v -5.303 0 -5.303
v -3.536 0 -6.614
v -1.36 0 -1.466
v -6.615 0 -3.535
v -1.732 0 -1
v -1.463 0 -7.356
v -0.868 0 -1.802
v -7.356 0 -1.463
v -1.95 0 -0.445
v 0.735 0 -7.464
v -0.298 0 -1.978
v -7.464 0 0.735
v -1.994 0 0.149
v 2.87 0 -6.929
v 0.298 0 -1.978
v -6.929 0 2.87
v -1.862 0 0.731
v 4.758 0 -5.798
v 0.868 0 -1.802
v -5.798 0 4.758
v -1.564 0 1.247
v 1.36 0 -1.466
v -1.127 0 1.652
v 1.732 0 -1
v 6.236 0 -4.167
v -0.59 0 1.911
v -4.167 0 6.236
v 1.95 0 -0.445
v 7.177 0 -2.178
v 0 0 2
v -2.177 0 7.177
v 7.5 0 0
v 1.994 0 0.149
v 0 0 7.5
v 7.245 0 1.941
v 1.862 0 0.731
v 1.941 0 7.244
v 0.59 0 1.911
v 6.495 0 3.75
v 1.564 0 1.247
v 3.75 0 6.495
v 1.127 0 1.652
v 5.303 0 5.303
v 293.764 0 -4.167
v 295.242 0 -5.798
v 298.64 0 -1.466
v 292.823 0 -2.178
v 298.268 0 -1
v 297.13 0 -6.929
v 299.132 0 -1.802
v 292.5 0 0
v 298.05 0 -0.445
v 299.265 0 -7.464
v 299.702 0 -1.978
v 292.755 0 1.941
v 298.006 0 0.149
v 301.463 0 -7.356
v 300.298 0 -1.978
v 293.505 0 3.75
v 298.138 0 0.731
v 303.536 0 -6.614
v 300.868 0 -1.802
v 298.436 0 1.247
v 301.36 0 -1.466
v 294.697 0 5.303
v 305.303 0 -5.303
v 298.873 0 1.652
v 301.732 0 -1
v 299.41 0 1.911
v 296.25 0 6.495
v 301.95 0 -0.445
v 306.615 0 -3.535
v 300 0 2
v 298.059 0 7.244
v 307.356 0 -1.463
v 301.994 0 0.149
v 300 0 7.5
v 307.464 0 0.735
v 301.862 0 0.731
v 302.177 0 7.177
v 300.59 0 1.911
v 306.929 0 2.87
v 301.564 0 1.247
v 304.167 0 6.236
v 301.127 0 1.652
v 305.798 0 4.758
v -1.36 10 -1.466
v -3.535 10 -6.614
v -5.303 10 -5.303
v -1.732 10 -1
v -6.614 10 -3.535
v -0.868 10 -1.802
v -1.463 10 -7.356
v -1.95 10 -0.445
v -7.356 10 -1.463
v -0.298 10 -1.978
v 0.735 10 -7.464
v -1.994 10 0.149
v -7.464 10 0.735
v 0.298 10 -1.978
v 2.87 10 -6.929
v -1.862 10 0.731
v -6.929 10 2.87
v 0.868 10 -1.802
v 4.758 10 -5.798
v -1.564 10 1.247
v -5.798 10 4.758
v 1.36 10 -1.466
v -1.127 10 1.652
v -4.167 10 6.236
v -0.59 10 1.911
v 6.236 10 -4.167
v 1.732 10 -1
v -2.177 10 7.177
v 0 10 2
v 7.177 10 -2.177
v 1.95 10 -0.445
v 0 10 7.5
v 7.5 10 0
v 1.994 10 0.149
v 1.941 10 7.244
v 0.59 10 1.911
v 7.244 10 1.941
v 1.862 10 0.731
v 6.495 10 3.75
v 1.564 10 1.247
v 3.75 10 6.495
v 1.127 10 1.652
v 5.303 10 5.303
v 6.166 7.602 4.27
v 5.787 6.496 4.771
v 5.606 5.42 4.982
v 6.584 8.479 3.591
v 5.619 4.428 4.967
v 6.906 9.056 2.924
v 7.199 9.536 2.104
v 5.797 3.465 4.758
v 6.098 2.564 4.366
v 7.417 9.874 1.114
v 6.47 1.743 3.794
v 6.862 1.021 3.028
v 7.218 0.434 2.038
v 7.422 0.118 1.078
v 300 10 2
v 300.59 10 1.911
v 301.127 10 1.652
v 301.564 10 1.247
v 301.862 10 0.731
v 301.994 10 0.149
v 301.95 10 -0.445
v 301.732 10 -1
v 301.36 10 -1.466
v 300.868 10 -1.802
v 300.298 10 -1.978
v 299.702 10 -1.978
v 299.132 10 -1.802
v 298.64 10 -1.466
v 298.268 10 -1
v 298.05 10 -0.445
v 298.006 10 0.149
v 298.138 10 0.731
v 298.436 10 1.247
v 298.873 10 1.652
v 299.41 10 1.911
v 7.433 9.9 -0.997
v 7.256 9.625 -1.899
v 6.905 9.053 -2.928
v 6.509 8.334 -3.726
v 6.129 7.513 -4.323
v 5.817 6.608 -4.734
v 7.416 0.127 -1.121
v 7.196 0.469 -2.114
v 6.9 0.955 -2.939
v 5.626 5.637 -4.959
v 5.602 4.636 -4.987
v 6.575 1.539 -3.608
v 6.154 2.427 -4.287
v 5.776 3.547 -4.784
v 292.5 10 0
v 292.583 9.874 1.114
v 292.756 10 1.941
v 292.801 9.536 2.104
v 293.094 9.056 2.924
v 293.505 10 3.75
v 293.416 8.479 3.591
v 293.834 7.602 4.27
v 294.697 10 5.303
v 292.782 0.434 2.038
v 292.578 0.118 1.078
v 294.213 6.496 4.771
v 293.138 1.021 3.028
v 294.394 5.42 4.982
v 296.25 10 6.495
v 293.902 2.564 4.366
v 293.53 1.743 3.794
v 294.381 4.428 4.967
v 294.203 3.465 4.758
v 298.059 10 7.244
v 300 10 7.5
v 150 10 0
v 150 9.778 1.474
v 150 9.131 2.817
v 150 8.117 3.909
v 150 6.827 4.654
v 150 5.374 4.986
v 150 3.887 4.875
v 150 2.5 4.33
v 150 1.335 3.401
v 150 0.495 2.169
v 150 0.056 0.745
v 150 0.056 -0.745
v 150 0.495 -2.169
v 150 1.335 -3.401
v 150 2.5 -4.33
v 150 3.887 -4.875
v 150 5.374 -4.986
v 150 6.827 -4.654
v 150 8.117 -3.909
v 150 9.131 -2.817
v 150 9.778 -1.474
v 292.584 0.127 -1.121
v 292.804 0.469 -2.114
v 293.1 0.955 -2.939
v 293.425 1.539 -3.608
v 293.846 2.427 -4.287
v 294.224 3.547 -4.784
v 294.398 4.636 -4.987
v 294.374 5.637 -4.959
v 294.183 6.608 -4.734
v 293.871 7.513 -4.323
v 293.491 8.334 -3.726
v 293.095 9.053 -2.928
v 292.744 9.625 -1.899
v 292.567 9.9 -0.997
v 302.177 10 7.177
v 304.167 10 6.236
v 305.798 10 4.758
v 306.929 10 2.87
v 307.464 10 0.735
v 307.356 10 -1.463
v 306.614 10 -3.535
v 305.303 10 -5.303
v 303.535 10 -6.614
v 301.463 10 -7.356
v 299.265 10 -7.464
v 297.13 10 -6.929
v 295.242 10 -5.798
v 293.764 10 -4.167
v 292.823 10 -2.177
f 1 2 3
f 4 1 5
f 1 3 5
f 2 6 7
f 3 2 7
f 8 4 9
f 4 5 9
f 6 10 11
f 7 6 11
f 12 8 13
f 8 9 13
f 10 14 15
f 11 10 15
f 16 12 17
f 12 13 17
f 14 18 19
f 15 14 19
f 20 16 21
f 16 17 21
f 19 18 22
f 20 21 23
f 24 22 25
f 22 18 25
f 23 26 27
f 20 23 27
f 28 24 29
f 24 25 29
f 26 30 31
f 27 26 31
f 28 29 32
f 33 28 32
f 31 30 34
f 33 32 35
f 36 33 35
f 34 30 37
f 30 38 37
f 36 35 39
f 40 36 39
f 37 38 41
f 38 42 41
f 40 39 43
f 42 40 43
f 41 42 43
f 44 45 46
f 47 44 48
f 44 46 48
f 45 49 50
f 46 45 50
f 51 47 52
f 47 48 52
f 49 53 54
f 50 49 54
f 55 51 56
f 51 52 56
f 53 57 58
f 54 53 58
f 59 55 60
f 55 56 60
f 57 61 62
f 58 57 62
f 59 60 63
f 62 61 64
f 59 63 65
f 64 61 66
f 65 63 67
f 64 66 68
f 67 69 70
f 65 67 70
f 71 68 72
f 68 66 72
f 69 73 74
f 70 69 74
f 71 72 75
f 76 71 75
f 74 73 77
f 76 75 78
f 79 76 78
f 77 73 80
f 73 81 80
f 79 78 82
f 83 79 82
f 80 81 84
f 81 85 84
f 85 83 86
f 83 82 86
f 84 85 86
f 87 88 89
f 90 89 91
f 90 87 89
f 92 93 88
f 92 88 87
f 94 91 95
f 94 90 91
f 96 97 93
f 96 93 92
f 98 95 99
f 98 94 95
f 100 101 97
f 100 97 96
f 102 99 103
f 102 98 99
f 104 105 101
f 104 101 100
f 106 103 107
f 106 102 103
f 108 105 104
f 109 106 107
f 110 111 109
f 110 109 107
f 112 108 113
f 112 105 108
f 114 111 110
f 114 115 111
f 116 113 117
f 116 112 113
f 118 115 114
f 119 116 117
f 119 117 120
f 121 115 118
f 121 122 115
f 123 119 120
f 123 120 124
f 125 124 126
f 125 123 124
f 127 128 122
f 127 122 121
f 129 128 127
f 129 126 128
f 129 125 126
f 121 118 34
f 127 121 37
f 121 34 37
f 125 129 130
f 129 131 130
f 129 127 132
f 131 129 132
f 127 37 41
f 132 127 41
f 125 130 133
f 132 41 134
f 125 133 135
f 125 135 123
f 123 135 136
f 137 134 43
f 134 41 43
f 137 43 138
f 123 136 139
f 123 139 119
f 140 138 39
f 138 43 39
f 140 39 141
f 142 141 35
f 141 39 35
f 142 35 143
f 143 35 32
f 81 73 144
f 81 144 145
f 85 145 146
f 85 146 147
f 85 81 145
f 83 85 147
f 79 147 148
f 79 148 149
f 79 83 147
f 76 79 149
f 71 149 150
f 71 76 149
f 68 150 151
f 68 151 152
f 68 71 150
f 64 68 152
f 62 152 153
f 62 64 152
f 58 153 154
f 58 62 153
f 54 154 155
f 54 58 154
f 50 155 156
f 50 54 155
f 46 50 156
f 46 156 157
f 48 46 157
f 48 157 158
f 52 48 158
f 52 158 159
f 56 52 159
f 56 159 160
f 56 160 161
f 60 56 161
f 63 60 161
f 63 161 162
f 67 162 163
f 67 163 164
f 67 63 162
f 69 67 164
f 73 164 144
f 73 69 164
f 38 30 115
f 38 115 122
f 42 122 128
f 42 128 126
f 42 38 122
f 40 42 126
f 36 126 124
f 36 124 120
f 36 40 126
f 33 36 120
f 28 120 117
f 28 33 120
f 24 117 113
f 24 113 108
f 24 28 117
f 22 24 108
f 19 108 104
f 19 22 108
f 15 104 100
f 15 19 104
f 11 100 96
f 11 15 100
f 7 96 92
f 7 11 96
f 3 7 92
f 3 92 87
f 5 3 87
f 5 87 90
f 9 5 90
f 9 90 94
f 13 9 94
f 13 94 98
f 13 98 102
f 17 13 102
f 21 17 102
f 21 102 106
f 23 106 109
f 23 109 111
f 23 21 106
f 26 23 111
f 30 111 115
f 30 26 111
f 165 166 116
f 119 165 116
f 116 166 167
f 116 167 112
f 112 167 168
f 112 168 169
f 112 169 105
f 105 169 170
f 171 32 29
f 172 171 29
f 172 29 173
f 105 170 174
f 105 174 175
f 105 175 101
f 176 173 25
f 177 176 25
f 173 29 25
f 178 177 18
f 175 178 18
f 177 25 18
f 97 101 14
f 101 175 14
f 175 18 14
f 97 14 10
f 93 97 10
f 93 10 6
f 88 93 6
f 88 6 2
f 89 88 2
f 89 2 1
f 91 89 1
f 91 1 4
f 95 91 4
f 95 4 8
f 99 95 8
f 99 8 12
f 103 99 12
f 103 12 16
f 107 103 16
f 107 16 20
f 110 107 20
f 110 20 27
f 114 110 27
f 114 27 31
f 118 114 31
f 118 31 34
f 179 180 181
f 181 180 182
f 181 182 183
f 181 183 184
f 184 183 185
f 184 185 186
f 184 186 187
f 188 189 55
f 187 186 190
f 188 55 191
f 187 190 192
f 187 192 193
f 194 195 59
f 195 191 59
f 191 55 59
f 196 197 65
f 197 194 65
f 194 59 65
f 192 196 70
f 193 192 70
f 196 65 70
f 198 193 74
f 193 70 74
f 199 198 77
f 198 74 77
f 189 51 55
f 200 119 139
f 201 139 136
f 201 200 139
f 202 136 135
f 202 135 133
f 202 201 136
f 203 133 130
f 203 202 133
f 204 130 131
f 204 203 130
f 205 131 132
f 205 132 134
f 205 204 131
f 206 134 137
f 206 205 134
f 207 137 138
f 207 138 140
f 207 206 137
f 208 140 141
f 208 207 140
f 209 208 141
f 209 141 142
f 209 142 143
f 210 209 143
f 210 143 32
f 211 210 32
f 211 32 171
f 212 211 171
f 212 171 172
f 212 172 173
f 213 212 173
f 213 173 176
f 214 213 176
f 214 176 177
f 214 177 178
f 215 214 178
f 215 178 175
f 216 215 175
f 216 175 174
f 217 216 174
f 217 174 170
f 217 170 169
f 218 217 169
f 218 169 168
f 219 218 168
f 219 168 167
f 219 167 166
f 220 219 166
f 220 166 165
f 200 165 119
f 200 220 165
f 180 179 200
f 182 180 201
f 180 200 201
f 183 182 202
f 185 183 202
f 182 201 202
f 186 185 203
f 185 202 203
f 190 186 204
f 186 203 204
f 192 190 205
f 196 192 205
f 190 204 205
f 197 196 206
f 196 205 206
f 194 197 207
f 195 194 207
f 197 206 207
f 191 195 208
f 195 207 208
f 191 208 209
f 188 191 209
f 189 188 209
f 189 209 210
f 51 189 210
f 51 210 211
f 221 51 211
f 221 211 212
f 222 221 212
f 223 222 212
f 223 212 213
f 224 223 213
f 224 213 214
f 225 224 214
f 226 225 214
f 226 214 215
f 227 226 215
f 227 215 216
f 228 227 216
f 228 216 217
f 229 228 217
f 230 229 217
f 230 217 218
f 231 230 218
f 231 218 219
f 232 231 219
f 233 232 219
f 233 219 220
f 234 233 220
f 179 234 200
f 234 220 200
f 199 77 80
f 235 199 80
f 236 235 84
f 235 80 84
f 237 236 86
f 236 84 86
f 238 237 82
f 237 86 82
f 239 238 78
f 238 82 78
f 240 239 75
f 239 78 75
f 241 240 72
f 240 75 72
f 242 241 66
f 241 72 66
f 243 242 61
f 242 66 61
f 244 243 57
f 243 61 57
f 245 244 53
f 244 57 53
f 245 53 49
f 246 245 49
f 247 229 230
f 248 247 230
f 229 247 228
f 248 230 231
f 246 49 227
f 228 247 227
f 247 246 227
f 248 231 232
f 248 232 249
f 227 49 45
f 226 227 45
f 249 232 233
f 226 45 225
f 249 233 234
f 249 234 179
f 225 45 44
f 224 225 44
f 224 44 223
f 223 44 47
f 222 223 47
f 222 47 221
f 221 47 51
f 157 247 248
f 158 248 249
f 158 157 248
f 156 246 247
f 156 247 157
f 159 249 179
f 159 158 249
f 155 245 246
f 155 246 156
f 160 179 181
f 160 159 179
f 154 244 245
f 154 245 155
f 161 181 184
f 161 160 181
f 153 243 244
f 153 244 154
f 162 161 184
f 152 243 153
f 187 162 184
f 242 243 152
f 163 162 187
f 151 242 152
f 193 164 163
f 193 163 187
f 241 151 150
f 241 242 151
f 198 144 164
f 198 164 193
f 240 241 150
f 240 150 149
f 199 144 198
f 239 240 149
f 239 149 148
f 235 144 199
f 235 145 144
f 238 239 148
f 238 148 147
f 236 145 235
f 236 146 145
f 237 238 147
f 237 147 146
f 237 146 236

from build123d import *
from build123d.topology import SkipClean

# Parameters (mm, degrees)
SKETCH1_R                            = 7.5
SKETCH1_R_2                          = 2
BOSS_EXTRUDE1_DEPTH                  = 10
BOSS_EXTRUDE1_2_DEPTH                = 10
BOSS_EXTRUDE2_REACH                  = 159.995
BOSS_EXTRUDE2_END_RADIUS             = 7.5
SKETCH2_R                            = 5
BOSS_EXTRUDE2_DIRECTION_2_REACH      = 159.995
BOSS_EXTRUDE2_DIRECTION_2_END_RADIUS = 7.5


with BuildPart() as part:
    # Sketch1 → Boss-Extrude1 (new body)
    with BuildSketch(Plane(origin=(0, 0, 0), x_dir=(1, 0, 0), z_dir=(0, 1, 0))):
        with Locations(Location((0, 0, 0), (0, 0, 270))):
            Circle(SKETCH1_R)
        with Locations(Location((0, 0, 0), (0, 0, 270))):
            Circle(SKETCH1_R_2, mode=Mode.SUBTRACT)
    extrude(amount=BOSS_EXTRUDE1_DEPTH)



with BuildPart() as body_2:
    # Sketch1 → Boss-Extrude1 2 (new body)
    with BuildSketch(Plane(origin=(0, 0, 0), x_dir=(1, 0, 0), z_dir=(0, 1, 0))):
        with Locations(Location((300, 0, 0), (0, 0, 270))):
            Circle(SKETCH1_R)
        with Locations(Location((300, 0, 0), (0, 0, 270))):
            Circle(SKETCH1_R_2, mode=Mode.SUBTRACT)
    extrude(amount=BOSS_EXTRUDE1_2_DEPTH)


with BuildPart() as part_1:
    with SkipClean():  # the faces are left unmerged after this step: merging them gives an invalid solid
        add(part.part)

        add(body_2.part)  # Boss-Extrude2 merges body 2
        # Boss-Extrude2: up to this cylinder (the profile starts outside it)
        boss_extrude2_end = Plane(origin=(300, 5, 0), z_dir=(0, -1, 0)) * Cylinder(BOSS_EXTRUDE2_END_RADIUS, 335.99, mode=Mode.PRIVATE)
        # Sketch2 → Boss-Extrude2 (add, up to the surface)
        with BuildSketch(Plane(origin=(150, 0, 0), x_dir=(0, 0, -1), z_dir=(1, 0, 0)), mode=Mode.PRIVATE) as boss_extrude2_sk1:
            with Locations(Location((0, 5, 0), (0, 0, 90))):
                Circle(SKETCH2_R)
        boss_extrude2_tool1 = extrude(boss_extrude2_sk1.sketch, amount=BOSS_EXTRUDE2_REACH, mode=Mode.PRIVATE) - boss_extrude2_end
        add(boss_extrude2_tool1.solids().sort_by_distance((150, 5, 0))[0])

    # Boss-Extrude2 direction 2: up to this cylinder (the profile starts outside it)
    boss_extrude2_direction_2_end = Plane(origin=(0, 5, 0), z_dir=(0, -1, 0)) * Cylinder(BOSS_EXTRUDE2_DIRECTION_2_END_RADIUS, 335.99, mode=Mode.PRIVATE)
    # Sketch2 → Boss-Extrude2 direction 2 (add, up to the surface)
    with BuildSketch(Plane(origin=(150, 0, 0), x_dir=(0, 0, -1), z_dir=(1, 0, 0)), mode=Mode.PRIVATE) as boss_extrude2_direction_2_sk1:
        with Locations(Location((0, 5, 0), (0, 0, 90))):
            Circle(SKETCH2_R)
    boss_extrude2_direction_2_tool1 = extrude(boss_extrude2_direction_2_sk1.sketch, amount=-BOSS_EXTRUDE2_DIRECTION_2_REACH, mode=Mode.PRIVATE) - boss_extrude2_direction_2_end
    add(boss_extrude2_direction_2_tool1.solids().sort_by_distance((150, 5, 0))[0])


solid = part_1.part
